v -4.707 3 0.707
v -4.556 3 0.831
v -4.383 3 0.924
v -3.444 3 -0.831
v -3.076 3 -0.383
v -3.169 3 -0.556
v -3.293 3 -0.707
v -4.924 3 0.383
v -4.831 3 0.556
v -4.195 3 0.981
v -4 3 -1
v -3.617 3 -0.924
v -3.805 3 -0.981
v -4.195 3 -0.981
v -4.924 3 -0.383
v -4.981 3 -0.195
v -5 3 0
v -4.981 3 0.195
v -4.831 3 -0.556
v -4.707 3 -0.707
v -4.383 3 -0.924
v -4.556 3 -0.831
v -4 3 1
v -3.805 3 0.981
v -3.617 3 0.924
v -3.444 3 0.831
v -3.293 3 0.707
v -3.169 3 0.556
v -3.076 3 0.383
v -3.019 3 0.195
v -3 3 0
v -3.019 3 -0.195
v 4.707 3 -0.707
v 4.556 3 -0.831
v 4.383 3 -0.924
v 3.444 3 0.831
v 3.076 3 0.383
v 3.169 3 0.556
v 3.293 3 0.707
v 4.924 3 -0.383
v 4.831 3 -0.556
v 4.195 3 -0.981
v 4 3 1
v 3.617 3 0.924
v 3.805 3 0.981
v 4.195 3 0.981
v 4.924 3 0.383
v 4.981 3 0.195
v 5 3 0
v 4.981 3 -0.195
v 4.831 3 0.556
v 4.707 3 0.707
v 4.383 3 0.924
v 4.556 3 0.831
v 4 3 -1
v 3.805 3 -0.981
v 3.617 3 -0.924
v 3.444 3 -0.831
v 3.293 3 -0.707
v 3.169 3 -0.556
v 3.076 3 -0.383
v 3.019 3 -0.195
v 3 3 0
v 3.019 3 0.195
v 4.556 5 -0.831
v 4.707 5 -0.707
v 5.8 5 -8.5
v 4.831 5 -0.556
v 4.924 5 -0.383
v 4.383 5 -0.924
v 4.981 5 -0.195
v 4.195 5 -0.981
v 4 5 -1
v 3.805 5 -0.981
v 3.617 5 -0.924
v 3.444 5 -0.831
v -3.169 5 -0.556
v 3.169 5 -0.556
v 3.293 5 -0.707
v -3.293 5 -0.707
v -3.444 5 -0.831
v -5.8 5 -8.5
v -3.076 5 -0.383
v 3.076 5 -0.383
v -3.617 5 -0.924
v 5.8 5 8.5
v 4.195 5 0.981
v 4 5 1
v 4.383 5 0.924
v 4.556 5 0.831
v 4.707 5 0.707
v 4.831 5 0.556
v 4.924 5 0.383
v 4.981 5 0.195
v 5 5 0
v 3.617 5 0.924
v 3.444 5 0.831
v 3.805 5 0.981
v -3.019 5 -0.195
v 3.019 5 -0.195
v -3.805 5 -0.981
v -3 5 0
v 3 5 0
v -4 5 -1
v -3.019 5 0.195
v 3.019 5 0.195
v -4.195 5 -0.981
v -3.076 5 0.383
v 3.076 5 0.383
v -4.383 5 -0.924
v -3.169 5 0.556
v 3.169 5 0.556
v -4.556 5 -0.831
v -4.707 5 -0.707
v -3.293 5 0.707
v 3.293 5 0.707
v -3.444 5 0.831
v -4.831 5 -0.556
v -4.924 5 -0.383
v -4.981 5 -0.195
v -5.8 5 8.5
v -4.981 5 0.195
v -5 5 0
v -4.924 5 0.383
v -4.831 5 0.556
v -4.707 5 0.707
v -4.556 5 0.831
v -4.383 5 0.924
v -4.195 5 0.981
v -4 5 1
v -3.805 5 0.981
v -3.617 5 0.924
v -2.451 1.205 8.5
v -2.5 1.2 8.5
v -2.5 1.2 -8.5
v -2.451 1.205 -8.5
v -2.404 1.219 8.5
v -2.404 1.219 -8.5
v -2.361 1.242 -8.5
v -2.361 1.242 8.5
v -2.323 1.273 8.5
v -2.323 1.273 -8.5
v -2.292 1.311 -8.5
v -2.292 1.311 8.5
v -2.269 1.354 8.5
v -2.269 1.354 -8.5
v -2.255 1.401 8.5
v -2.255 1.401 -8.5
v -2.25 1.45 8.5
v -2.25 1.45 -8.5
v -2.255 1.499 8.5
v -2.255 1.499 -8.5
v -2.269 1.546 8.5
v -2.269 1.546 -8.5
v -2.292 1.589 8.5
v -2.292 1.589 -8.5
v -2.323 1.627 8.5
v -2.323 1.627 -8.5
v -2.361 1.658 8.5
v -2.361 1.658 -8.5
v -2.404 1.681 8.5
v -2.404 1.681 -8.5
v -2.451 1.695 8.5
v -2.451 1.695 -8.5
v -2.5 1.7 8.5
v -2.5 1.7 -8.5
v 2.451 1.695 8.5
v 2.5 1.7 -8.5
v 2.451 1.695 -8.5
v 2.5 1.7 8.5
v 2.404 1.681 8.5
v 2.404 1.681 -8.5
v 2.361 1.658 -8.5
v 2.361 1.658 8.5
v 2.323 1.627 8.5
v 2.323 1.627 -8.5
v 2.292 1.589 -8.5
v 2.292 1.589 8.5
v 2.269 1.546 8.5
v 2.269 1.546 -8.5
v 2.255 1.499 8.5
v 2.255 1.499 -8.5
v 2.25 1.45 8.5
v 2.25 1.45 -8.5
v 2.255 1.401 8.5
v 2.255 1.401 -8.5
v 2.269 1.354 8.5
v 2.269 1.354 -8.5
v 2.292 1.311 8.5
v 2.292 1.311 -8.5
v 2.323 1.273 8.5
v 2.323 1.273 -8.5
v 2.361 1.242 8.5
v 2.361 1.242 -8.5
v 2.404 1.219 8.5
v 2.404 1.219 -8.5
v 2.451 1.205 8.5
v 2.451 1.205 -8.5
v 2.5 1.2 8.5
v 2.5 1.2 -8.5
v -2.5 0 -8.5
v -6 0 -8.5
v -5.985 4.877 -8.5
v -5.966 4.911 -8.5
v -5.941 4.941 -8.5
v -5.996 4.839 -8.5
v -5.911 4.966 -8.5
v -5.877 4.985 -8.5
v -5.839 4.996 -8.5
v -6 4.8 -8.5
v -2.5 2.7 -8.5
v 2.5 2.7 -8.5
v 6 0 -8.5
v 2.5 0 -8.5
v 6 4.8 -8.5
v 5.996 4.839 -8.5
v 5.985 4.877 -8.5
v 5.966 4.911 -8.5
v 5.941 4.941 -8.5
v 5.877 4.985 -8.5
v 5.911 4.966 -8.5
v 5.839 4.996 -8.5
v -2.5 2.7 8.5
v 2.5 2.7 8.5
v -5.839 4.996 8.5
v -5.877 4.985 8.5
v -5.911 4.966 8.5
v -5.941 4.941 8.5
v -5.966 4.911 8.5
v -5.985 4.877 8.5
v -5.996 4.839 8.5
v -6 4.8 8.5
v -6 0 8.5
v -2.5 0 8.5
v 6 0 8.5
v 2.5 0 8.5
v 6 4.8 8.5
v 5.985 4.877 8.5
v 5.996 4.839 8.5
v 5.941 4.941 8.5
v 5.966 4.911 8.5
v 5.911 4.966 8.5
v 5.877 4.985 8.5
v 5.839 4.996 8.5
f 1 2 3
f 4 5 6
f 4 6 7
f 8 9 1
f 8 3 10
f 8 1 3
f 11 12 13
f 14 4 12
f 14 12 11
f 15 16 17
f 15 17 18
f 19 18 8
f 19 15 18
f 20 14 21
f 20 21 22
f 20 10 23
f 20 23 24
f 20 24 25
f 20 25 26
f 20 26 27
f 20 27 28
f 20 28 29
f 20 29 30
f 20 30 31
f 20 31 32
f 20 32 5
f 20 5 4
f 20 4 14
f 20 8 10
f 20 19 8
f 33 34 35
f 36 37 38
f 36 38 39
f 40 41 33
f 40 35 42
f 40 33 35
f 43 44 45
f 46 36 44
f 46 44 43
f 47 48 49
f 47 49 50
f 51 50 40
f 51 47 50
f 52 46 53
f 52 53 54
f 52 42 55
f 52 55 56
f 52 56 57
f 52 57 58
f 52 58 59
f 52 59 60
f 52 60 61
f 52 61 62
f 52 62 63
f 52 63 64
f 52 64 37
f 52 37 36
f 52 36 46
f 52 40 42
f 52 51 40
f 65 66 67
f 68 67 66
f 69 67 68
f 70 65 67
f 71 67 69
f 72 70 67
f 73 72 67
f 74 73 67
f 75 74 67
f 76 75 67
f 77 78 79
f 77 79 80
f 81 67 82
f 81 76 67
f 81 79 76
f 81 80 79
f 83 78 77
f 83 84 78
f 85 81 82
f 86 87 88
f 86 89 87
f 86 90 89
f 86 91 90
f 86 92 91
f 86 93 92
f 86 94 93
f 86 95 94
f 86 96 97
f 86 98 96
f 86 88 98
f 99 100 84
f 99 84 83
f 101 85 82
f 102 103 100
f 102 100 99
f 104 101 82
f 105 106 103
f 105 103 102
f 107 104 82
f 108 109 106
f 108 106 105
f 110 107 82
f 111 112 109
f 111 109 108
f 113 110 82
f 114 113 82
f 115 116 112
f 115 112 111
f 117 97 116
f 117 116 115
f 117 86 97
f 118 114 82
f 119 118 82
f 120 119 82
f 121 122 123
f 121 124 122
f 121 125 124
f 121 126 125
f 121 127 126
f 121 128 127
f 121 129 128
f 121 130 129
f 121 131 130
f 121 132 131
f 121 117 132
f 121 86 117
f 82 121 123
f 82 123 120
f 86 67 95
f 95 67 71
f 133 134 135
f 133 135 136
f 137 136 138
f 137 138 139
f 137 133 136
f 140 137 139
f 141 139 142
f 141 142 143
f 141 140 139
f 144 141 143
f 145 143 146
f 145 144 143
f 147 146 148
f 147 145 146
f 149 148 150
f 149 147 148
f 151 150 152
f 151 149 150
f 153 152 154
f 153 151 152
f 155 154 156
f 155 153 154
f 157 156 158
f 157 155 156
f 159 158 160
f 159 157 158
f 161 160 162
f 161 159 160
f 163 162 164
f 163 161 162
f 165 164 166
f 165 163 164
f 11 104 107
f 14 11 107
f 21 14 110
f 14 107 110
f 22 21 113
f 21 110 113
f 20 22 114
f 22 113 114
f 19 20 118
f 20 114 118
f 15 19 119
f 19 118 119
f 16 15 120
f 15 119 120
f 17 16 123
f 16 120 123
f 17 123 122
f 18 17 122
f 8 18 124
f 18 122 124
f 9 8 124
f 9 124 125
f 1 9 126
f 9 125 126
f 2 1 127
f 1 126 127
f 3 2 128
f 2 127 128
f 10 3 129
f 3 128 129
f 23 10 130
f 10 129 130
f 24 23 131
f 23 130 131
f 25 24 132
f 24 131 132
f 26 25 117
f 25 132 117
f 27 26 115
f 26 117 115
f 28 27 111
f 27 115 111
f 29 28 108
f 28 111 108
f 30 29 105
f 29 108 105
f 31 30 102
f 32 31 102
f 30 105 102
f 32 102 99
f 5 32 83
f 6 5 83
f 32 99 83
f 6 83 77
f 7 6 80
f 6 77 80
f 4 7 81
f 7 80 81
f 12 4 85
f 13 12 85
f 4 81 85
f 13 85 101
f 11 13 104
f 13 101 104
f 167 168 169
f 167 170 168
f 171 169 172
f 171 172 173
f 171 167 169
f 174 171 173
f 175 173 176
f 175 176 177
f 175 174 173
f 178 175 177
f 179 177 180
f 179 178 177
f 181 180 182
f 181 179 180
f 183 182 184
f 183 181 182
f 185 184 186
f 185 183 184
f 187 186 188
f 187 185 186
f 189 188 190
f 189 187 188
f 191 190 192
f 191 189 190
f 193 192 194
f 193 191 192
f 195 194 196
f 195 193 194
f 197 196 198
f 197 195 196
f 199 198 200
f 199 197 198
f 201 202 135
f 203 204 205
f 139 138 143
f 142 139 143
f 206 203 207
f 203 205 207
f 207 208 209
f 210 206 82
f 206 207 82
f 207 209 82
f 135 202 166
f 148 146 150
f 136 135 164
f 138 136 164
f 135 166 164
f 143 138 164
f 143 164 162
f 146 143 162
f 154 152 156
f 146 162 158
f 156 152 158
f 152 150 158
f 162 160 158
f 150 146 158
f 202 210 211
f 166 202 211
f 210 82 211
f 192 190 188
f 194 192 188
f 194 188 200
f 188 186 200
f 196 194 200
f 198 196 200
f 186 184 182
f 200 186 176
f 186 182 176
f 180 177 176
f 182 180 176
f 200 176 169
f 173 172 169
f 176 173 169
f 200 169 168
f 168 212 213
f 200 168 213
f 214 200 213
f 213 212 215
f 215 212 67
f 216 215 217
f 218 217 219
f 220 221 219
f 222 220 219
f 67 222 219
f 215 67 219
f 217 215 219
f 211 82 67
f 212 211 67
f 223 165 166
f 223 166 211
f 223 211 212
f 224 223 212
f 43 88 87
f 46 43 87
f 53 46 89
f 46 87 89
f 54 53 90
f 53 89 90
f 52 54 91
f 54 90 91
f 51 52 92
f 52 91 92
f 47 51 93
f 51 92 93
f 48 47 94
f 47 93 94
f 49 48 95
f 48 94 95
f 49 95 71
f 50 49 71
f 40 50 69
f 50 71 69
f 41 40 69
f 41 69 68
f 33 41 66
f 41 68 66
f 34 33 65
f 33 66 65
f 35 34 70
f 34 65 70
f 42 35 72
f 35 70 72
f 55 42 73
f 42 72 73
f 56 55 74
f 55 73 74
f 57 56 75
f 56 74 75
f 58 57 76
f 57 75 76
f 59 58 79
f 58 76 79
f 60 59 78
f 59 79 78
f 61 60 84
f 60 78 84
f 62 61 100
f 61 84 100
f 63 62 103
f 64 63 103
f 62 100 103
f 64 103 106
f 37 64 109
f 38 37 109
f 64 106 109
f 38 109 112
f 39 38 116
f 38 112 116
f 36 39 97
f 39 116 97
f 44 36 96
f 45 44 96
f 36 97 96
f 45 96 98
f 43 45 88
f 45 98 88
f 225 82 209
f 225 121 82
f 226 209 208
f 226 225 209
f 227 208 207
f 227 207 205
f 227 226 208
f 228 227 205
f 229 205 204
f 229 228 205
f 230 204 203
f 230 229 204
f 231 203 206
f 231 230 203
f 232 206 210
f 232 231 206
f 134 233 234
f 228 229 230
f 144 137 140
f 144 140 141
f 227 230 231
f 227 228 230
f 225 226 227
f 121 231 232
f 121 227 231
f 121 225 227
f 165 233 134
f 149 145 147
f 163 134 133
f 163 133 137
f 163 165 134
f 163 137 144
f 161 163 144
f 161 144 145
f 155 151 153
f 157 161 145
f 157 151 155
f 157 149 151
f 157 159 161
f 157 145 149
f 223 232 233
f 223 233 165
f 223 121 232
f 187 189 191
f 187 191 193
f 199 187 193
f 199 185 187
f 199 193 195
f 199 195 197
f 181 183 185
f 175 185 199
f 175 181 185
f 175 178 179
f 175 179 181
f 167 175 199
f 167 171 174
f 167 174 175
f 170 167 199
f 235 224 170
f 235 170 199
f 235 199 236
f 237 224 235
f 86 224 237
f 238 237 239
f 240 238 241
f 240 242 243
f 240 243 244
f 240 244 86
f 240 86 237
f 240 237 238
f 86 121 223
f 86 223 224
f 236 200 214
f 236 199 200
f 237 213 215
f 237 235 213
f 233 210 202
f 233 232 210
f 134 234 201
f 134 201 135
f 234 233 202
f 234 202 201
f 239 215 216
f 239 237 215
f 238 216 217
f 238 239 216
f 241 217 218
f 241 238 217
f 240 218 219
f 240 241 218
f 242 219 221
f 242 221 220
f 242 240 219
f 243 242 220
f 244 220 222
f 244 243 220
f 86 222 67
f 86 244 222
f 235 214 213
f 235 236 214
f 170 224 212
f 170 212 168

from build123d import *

# Parameters (mm, degrees)
BOSS_EXTRUDE1_DEPTH = 8.5
SKETCH2_R           = 1
CUT_EXTRUDE1_DEPTH  = 2
FILLET1_R           = 0.2


with BuildPart() as part:
    # Sketch1 → Boss-Extrude1 (new, symmetric)
    with BuildSketch(Plane.XY):
        with BuildLine():
            Line((2.5, 0), (6, 0))
            Line((6, 0), (6, 5))
            Line((6, 5), (-6, 5))
            Line((-6, 5), (-6, 0))
            Line((-6, 0), (-2.5, 0))
            Line((-2.5, 0), (-2.5, 1.2))
            ThreePointArc((-2.5, 1.2), (-2.25, 1.45), (-2.5, 1.7))
            Line((-2.5, 1.7), (-2.5, 2.7))
            Line((-2.5, 2.7), (2.5, 2.7))
            Line((2.5, 2.7), (2.5, 1.7))
            ThreePointArc((2.5, 1.7), (2.25, 1.45), (2.5, 1.2))
            Line((2.5, 1.2), (2.5, 0))
        make_face()
    extrude(amount=BOSS_EXTRUDE1_DEPTH, both=True)

    # Sketch2 → Cut-Extrude1 (cut)
    with BuildSketch(Plane(origin=(0, 5, 0), x_dir=(1, 0, 0), z_dir=(0, 1, 0))):
        with Locations(Location((4, 0, 0), (0, 0, 270))):
            Circle(SKETCH2_R)
        with Locations(Location((-4, 0, 0), (0, 0, 90))):
            Circle(SKETCH2_R)
    extrude(amount=-CUT_EXTRUDE1_DEPTH, mode=Mode.SUBTRACT)

    # Fillet1
    fillet1_edges = [part.edges().sort_by_distance(p)[0] for p in [
        (-6, 5, 0),
        (6, 5, 0),
    ]]
    fillet(fillet1_edges, radius=FILLET1_R)


solid = part.part
